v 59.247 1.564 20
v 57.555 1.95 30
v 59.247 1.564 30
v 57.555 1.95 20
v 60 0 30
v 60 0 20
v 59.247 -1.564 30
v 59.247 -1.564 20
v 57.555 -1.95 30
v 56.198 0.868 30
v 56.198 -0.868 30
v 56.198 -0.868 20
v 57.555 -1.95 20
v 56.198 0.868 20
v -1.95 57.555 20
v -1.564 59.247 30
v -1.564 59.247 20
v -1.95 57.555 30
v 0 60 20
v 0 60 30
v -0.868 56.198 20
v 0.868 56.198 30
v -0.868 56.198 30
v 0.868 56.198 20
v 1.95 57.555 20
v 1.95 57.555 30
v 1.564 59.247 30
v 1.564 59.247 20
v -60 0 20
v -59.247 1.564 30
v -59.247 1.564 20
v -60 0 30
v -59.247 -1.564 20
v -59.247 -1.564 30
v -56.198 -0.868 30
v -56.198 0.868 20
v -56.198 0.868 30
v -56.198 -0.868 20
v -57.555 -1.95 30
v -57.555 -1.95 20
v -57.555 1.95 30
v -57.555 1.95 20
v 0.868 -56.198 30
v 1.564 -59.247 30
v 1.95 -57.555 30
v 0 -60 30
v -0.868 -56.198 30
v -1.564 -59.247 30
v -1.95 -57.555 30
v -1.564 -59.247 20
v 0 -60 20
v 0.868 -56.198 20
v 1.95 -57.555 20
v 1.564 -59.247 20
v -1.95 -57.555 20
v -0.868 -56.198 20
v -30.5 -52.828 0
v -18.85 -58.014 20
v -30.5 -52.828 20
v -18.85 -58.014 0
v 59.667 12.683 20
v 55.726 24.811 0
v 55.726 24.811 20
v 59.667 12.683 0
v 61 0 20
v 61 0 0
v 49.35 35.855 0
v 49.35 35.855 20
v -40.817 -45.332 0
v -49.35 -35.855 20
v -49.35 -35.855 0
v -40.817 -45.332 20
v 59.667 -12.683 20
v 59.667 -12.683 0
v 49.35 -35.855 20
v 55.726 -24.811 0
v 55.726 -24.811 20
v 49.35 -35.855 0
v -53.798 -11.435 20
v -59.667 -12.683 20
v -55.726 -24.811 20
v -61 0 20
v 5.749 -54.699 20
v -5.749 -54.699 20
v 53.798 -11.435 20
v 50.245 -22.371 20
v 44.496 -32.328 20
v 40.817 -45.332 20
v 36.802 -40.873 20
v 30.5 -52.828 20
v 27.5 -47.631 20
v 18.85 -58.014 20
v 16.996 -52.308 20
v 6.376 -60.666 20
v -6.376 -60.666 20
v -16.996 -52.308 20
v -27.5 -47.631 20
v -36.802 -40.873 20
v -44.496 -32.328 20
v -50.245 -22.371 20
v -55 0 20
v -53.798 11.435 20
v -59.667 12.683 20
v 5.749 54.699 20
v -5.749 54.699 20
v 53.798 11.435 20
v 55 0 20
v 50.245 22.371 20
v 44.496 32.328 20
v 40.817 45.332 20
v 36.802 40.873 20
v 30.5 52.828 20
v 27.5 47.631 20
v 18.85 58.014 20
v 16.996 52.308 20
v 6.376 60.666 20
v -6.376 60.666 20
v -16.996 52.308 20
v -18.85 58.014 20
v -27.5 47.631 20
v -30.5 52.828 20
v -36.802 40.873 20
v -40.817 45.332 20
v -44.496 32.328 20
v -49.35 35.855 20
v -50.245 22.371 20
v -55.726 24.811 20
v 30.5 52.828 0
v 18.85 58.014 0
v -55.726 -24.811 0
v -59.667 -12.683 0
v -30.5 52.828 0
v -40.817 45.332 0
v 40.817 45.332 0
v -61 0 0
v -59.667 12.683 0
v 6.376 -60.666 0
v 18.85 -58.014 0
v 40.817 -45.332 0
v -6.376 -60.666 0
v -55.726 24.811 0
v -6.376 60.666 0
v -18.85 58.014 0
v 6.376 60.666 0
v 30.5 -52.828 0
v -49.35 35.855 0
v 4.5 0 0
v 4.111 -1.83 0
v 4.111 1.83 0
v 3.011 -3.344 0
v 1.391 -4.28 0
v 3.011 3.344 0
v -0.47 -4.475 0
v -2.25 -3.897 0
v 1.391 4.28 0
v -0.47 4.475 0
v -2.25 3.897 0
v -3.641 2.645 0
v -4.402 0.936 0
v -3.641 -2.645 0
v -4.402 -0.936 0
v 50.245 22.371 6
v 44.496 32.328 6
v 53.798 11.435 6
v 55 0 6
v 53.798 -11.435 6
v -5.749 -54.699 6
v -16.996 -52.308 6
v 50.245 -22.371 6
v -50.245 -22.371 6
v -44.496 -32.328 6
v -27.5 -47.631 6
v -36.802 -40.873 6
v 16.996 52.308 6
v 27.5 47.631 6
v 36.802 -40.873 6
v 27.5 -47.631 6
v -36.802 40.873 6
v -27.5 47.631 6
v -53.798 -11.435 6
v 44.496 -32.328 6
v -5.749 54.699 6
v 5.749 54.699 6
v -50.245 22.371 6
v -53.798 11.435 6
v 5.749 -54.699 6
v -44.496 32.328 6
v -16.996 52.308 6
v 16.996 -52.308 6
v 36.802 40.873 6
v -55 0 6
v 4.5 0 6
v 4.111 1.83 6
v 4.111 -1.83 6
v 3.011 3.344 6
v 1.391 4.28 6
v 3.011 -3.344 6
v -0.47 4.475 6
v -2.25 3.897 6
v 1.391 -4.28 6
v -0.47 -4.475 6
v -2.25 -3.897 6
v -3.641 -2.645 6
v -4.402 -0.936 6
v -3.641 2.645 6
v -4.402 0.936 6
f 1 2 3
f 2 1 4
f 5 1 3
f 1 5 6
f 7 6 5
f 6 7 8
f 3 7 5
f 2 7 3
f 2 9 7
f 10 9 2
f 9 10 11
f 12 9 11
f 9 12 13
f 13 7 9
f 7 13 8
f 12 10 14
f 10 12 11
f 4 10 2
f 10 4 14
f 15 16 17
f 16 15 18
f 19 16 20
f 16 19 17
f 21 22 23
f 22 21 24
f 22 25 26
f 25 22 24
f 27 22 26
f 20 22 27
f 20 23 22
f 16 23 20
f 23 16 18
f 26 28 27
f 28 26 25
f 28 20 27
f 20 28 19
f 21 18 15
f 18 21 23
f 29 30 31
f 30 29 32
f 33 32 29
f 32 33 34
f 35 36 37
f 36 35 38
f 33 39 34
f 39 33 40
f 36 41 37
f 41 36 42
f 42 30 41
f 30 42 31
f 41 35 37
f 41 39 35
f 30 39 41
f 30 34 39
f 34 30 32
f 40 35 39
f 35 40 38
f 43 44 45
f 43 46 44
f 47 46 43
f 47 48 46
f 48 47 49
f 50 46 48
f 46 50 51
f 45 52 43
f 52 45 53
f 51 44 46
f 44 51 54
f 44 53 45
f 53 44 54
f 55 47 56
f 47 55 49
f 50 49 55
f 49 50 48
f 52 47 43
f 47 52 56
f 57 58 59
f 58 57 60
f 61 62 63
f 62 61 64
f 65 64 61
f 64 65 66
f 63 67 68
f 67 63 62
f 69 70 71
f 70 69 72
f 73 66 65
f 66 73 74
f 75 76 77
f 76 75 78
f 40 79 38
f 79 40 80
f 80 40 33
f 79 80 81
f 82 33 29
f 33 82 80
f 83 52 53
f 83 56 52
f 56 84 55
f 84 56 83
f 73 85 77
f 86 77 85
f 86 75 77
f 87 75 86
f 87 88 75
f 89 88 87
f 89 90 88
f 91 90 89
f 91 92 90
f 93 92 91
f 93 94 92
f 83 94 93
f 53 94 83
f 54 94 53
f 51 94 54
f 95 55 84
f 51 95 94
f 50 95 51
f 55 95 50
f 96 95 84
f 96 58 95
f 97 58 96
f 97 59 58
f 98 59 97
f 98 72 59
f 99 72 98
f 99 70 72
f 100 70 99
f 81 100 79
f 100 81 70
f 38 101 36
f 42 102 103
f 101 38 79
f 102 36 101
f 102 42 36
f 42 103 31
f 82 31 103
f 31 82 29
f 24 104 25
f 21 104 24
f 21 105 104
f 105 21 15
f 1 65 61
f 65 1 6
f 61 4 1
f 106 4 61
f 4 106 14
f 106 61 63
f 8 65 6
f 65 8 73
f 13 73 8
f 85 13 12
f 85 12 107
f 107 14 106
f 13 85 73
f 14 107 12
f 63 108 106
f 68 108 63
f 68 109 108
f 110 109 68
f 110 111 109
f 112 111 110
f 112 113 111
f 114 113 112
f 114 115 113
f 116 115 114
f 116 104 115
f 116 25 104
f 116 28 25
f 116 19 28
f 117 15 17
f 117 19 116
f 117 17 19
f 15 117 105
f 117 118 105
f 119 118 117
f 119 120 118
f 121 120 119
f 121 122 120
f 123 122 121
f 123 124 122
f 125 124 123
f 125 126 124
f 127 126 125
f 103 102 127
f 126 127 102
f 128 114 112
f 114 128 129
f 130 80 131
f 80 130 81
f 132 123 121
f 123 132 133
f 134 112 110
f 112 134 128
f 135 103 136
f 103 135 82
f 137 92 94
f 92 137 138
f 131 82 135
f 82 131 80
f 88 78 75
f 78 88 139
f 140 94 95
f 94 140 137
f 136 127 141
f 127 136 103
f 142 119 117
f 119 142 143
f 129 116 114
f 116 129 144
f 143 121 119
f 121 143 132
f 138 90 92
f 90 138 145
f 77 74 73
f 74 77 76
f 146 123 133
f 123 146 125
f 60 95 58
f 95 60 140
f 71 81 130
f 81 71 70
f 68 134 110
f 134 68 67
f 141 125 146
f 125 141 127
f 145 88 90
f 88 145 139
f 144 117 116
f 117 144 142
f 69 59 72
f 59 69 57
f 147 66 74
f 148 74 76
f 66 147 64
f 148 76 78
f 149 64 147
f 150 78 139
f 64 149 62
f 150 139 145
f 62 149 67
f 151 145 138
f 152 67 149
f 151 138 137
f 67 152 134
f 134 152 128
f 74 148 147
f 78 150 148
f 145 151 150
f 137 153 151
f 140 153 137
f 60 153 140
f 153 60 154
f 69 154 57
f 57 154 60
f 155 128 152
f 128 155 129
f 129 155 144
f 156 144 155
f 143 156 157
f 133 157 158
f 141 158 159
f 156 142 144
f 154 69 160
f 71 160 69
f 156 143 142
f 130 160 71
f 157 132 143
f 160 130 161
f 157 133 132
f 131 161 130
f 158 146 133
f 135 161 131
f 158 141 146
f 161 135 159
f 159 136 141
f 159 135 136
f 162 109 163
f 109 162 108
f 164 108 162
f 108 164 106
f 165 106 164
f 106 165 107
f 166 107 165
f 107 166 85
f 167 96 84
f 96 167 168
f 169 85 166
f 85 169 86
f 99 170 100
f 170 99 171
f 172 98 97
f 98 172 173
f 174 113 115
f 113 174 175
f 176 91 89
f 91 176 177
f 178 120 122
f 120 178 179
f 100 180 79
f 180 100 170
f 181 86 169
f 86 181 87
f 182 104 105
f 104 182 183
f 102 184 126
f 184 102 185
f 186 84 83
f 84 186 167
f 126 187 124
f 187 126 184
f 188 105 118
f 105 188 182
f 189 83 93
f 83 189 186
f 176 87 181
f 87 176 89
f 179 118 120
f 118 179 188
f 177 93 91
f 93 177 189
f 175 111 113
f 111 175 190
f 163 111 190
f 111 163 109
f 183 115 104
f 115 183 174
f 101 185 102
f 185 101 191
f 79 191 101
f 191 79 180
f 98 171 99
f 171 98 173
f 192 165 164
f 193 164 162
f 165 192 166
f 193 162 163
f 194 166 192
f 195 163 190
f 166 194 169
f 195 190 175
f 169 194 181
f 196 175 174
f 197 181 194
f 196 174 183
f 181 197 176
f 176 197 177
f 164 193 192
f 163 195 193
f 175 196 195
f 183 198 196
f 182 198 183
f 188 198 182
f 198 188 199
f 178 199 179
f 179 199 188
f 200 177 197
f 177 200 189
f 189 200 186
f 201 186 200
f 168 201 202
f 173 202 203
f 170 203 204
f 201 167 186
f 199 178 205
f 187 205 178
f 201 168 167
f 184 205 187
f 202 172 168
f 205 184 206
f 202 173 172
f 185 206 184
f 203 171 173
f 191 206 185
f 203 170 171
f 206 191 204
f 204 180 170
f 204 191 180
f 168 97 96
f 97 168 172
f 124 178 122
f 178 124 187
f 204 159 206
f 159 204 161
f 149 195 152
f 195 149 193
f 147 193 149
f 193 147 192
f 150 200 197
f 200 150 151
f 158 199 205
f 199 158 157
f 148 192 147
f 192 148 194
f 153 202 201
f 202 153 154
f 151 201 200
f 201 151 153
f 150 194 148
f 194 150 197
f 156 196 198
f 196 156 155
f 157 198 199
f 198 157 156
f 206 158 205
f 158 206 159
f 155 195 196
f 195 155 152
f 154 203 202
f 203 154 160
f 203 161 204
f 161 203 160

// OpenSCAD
difference() {
union() {
translate([0,0,20]) union() {
union() {
union() {
union() {
rotate([0,0,0]) translate([58,0,-10]) cylinder(20,2,2); 
}
rotate([0,0,90]) translate([58,0,-10]) cylinder(20,2,2); 
}
rotate([0,0,180]) translate([58,0,-10]) cylinder(20,2,2); 
}
rotate([0,0,270]) translate([58,0,-10]) cylinder(20,2,2); 
}
difference() {
cylinder(20,61,61); 
translate([0,0,6]) cylinder(20,55,55); 
}
}
cylinder(30,4.5,4.5); 
}
